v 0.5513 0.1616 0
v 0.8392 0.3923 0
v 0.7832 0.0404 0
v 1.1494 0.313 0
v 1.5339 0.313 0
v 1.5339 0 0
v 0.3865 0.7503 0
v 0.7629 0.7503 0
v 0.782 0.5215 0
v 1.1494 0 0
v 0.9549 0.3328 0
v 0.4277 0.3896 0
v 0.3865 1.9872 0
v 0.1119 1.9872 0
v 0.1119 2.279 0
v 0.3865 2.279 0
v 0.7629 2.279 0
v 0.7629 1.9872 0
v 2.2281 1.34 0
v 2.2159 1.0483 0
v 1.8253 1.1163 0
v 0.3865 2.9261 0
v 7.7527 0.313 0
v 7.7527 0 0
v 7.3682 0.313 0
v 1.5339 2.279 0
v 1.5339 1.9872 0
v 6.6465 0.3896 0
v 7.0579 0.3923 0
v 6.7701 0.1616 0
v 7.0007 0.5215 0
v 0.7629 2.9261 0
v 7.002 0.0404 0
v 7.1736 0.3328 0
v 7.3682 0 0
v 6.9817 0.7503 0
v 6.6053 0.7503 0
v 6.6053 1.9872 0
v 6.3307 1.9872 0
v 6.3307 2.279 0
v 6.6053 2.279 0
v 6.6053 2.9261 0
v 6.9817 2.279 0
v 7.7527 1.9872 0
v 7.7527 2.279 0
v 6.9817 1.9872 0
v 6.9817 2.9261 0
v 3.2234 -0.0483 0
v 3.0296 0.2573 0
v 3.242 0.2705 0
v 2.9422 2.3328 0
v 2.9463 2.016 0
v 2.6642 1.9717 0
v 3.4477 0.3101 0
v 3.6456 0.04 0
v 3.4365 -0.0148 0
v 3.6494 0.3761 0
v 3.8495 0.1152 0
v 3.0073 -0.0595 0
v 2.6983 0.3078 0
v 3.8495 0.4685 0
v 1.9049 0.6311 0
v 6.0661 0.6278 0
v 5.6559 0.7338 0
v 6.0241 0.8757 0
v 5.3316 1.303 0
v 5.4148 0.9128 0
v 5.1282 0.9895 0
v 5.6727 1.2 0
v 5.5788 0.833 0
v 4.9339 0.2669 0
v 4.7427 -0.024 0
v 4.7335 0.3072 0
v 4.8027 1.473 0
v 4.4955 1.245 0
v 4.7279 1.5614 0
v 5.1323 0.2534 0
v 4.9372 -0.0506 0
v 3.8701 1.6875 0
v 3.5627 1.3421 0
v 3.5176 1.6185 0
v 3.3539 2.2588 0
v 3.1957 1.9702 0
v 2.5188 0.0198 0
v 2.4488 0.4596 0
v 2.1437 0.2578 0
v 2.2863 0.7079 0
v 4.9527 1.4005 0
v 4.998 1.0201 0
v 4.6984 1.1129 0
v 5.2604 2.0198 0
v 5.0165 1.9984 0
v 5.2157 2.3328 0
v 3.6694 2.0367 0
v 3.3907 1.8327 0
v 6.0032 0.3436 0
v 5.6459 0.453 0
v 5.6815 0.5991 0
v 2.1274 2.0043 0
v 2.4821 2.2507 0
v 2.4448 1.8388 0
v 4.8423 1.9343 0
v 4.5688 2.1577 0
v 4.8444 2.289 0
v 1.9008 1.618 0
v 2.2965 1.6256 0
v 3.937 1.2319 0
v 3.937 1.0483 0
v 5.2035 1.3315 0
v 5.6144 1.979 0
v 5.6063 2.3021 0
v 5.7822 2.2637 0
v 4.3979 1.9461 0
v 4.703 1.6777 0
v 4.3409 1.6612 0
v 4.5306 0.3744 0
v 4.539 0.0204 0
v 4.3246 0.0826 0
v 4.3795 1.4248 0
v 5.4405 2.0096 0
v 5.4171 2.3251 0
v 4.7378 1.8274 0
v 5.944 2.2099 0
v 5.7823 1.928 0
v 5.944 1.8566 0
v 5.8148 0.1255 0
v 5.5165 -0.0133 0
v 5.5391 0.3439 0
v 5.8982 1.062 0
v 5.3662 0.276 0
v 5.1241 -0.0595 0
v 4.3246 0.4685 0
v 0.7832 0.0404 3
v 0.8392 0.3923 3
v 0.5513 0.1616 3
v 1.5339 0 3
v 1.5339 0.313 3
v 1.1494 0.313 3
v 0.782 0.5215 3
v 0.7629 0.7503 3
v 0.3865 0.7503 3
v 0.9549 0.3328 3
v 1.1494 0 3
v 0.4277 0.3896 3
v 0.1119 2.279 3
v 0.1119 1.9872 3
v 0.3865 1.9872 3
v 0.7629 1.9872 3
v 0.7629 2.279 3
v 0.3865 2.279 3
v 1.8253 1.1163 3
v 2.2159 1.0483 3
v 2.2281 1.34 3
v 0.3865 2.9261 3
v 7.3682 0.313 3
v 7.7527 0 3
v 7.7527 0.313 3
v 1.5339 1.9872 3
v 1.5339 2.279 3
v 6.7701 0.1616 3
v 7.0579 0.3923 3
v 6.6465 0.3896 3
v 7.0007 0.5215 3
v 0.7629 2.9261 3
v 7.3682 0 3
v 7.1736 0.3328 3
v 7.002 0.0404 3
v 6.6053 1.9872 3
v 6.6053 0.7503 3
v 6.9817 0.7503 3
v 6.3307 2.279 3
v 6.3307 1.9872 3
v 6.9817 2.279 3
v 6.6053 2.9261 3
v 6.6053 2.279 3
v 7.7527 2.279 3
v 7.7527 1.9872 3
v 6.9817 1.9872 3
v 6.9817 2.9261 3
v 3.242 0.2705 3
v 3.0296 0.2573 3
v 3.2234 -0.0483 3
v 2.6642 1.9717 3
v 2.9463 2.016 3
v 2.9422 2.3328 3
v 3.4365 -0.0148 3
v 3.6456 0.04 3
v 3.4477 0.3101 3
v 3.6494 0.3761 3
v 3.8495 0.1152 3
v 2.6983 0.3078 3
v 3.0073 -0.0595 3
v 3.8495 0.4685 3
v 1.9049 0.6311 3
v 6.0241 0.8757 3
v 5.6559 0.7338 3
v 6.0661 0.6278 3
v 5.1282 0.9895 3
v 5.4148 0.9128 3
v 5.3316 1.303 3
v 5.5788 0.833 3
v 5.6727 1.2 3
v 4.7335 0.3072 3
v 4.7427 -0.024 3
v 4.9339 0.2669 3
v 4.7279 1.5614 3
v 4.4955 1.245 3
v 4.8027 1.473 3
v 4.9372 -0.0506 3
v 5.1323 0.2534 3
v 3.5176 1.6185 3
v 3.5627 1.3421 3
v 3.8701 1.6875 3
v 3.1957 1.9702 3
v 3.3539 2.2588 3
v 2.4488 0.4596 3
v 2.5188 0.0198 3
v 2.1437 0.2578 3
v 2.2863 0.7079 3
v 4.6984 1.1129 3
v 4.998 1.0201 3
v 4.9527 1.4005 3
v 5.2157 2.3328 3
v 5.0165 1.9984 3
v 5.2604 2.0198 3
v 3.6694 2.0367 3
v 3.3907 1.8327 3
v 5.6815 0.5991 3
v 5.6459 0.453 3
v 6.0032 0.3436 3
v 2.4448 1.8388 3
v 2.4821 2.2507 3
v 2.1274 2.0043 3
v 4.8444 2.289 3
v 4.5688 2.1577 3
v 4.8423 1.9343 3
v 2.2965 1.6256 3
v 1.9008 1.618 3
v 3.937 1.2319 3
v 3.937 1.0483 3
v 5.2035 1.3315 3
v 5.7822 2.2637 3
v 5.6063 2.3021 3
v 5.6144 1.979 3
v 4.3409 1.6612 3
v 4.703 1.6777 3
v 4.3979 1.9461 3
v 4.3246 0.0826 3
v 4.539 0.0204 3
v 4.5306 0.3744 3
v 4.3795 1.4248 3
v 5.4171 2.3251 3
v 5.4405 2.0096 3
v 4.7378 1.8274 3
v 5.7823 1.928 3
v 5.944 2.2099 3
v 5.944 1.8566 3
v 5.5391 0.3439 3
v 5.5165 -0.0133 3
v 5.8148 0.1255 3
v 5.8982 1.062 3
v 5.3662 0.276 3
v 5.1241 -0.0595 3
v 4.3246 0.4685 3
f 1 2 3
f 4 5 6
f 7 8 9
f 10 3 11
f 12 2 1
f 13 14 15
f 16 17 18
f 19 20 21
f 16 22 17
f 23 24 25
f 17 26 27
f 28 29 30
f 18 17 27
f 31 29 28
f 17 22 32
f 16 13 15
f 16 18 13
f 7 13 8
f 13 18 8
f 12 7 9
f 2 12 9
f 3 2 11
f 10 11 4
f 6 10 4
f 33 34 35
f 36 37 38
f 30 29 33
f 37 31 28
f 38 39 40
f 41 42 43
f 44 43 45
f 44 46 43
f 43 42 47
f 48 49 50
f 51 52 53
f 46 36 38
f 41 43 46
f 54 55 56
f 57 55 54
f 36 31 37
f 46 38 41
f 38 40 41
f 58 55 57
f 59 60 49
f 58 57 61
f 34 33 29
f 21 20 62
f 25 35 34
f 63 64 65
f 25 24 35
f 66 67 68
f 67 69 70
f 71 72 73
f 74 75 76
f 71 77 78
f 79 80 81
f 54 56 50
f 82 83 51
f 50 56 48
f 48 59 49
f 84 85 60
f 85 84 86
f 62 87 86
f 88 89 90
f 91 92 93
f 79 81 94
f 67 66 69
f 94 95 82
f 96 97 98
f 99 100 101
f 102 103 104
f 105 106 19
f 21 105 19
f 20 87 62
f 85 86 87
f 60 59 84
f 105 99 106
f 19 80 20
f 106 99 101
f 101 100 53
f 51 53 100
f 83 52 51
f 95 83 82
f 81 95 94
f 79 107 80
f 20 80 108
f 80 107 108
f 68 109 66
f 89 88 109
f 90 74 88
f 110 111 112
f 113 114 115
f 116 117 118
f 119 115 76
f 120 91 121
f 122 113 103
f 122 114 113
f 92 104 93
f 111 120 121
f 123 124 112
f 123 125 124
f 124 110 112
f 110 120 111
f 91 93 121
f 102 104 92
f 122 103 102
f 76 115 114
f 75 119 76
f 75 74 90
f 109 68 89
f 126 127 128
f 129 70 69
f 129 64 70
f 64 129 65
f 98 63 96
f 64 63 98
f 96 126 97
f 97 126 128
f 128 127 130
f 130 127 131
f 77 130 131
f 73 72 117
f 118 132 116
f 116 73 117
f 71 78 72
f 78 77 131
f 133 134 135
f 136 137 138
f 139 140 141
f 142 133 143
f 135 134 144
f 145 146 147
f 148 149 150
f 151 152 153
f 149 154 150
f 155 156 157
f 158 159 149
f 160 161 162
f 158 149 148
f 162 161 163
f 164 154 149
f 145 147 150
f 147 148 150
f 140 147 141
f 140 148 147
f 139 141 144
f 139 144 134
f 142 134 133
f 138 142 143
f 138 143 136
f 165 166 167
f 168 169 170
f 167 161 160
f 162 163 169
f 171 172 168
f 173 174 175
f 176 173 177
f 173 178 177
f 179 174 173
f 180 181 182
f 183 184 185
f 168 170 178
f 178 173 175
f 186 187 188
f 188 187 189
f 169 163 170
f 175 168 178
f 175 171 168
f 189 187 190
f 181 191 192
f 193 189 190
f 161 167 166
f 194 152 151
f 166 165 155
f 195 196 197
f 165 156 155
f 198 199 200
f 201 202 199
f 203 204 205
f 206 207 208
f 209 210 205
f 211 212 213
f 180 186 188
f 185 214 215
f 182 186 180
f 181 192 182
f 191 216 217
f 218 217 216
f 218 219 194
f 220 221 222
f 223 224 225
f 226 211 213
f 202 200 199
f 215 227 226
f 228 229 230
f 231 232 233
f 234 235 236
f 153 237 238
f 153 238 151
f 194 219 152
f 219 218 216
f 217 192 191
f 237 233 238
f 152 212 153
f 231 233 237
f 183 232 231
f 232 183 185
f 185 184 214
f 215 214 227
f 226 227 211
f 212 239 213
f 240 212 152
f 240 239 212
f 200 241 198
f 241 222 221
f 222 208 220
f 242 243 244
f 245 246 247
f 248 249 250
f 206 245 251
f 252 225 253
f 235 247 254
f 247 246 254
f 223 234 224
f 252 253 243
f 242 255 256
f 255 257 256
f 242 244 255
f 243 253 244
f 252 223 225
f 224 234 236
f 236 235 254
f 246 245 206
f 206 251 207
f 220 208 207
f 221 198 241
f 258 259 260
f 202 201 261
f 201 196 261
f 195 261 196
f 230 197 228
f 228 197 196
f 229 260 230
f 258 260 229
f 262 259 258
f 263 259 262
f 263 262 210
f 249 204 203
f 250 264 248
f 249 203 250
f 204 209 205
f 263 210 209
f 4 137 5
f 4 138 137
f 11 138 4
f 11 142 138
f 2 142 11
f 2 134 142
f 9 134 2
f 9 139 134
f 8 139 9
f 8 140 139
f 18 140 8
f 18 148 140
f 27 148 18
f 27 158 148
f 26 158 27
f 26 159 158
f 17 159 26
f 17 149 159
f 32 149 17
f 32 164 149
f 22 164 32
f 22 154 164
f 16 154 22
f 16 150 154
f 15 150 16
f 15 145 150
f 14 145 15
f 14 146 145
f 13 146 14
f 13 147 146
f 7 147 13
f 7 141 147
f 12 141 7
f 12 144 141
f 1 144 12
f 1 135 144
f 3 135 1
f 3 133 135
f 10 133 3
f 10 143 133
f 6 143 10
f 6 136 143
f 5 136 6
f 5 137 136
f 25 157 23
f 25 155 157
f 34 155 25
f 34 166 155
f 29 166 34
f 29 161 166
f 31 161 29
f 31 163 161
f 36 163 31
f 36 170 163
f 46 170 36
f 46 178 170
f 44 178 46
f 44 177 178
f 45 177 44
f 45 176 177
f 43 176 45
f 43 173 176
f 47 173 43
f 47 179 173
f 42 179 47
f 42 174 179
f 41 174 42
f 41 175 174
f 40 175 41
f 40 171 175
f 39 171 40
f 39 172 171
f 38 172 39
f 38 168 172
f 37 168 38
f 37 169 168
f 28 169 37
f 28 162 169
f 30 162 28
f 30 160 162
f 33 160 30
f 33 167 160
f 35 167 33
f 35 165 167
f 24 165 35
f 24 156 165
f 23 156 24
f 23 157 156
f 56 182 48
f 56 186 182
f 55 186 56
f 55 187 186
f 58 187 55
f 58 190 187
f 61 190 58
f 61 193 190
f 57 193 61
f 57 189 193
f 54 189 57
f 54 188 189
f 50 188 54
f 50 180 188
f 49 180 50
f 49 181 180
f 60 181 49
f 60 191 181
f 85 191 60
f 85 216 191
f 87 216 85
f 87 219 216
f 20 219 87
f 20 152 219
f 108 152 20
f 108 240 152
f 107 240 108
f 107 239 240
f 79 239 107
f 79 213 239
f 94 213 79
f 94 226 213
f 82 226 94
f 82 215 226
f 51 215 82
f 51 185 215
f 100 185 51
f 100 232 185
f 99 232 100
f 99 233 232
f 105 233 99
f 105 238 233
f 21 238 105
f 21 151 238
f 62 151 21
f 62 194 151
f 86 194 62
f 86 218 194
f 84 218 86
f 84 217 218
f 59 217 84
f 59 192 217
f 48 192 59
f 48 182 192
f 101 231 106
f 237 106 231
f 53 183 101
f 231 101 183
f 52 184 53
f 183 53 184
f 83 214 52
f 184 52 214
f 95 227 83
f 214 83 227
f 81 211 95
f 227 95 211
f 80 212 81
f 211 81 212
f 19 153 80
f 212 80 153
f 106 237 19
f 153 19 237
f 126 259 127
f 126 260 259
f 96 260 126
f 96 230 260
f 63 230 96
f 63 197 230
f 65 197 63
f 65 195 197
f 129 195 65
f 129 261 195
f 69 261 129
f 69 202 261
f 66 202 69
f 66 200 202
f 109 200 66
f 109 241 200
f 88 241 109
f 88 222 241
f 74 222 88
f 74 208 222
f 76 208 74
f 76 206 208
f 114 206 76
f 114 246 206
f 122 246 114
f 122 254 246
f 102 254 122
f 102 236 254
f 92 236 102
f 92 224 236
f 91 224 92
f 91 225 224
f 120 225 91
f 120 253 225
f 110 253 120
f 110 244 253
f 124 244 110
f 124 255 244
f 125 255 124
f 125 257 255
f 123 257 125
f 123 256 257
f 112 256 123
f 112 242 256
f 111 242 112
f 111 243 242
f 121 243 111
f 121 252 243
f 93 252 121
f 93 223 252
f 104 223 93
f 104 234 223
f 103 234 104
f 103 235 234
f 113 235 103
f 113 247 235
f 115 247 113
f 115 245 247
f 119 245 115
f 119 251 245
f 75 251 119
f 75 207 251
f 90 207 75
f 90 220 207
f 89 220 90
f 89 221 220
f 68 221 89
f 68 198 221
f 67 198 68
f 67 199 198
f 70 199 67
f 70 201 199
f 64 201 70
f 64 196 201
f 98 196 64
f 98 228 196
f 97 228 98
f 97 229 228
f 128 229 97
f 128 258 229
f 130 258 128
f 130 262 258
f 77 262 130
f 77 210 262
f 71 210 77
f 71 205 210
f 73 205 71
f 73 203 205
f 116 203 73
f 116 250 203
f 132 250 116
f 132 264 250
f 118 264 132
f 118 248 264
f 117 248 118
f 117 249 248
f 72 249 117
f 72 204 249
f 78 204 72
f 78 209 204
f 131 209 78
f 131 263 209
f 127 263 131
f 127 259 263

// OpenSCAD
texte_a_inserer = "test"; 
taille = 3; 
police = "DejaVuSans"; //[[Abril Fatface,Aclonica,Acme,Advent Pro,Akronim,Aladin,Alegreya,Alegreya Sans,Alegreya SC,Alex Brush,Alfa Slab One,Alice,Amaranth,Architects Daughter,Archivo Black,Archivo Narrow,Arimo,Arvo,Asap,Astloch,Asul,Averia Libre,Averia Serif Libre,Bangers,Basic,Belgrano,Berkshire Swash,Bigshot One,Bilbo Swash Caps,Black Ops One,Bonbon,Bowlby One SC,Brawler,Bubblegum Sans,Butterfly Kids,Cabin Condensed,Caesar Dressing,Cagliostro,Calligraffitti,Capriola,Carter One,Changa One,Chango,Chelsea Market,Cherry Cream Soda,Chewy,Chicle,Chivo,Clicker Script,Coming Soon,Concert One,Condiment,Cookie,Courgette,Covered By Your Grace,Crimson Text,Dancing Script,DejaVu Sans,DejaVu Serif,Dhurjati,Doppio One,Dosis,Droid Sans,Eagle Lake,Electrolize,Emilys Candy,Encode Sans,Encode Sans Compressed,Euphoria Script,Exo,Exo 2,Faster One,Federo,Finger Paint,Fjord One,Fontdiner Swanky,Freckle Face,Fruktur,Gabriela,Geo,Germania One,Give You Glory,Gloria Hallelujah,Goudy Bookletter 1911,Graduate,Grand Hotel,Great Vibes,Griffy,Hanalei Fill,Happy Monkey,Henny Penny,Hind,IM Fell English SC,Indie Flower,Irish Grover,Italianno,Jacques Francois Shadow,Jolly Lodger,Josefin Slab,Joti One,Judson,Just Another Hand,Kalam,Kameron,Karma,Kavoon,Knewave,Kranky,Kristi,Laila,Lakki Reddy,Lancelot,Lato,Leckerli One,Ledger,Lekton,Lemon One,Liberation Sans,Libre Caslon Text,Life Savers,Lilita One,Lily Script One,Limelight,Lobster,Lobster Two,Londrina Outline,Londrina Shadow,Londrina Solid,Lora,Love Ya Like A Sister,Loved by the King,Lovers Quarrel,Luckiest Guy,Lusitana,Macondo,Macondo Swash Caps,Mako,Marck Script,Margarine,Marko One,Maven Pro,McLaren,MedievalSharp,Merienda One,Merriweather,Mervale Script,Metal Mania,Metrophobic,Milonga,Miltonian Tattoo,Miss Fajardose,Molle,Montez,Montserrat,Mr De Haviland,Mystery Quest,Neucha,New Rocker,Niconne,Nosifer,Nothing You Could Do,Noto Sans Oriya,Noto Serif,Nova Square,Nunito,Old Standard TT,Oleo Script,Oleo Script Swash Caps,Orbitron,Oregano,Orienta,Original Surfer,Oswald,Over the Rainbow,Overlock,Oxygen,Pacifico,Paprika,Parisienne,Patrick Hand SC,Paytone One,Peralta,Permanent Marker,Piedra,Pirata One,Play,Playball,Poetsen One,Poppins,Press Start 2P,Princess Sofia,PT Mono,Qwigley,Racing Sans One,Raleway,Rancho,Ranga,Ribeye,Roboto,Roboto Condensed,Roboto Slab,Rochester,Rock Salt,Rubik One,Sail,Salsa,Sansita One,Sarina,Satisfy,Schoolbell,Seaweed Script,Sevillana,Shadows Into Light,Shadows Into Light Two,Share,Six Caps,Skranji,Source Sans Pro,Spicy Rice,Stardos Stencil,Stoke,Syncopate,Teko,Terminal Dosis,The Girl Next Door,Tillana,Timmana,Titillium Web,Ubuntu,Ultra,Underdog,UnifrakturCook,UnifrakturMaguntia,Vampiro One,Vidaloka,Viga,Voces,Volkhov,Vollkorn,Voltaire,Waiting for the Sunrise,Wallpoet,Wellfleet,Wendy One,Yellowtail,Yesteryear,Zeyada]]
hauteur = 3; 
module rendu(){
linear_extrude(hauteur) text(texte_a_inserer,size = taille, font = police);
}
rendu();
 
